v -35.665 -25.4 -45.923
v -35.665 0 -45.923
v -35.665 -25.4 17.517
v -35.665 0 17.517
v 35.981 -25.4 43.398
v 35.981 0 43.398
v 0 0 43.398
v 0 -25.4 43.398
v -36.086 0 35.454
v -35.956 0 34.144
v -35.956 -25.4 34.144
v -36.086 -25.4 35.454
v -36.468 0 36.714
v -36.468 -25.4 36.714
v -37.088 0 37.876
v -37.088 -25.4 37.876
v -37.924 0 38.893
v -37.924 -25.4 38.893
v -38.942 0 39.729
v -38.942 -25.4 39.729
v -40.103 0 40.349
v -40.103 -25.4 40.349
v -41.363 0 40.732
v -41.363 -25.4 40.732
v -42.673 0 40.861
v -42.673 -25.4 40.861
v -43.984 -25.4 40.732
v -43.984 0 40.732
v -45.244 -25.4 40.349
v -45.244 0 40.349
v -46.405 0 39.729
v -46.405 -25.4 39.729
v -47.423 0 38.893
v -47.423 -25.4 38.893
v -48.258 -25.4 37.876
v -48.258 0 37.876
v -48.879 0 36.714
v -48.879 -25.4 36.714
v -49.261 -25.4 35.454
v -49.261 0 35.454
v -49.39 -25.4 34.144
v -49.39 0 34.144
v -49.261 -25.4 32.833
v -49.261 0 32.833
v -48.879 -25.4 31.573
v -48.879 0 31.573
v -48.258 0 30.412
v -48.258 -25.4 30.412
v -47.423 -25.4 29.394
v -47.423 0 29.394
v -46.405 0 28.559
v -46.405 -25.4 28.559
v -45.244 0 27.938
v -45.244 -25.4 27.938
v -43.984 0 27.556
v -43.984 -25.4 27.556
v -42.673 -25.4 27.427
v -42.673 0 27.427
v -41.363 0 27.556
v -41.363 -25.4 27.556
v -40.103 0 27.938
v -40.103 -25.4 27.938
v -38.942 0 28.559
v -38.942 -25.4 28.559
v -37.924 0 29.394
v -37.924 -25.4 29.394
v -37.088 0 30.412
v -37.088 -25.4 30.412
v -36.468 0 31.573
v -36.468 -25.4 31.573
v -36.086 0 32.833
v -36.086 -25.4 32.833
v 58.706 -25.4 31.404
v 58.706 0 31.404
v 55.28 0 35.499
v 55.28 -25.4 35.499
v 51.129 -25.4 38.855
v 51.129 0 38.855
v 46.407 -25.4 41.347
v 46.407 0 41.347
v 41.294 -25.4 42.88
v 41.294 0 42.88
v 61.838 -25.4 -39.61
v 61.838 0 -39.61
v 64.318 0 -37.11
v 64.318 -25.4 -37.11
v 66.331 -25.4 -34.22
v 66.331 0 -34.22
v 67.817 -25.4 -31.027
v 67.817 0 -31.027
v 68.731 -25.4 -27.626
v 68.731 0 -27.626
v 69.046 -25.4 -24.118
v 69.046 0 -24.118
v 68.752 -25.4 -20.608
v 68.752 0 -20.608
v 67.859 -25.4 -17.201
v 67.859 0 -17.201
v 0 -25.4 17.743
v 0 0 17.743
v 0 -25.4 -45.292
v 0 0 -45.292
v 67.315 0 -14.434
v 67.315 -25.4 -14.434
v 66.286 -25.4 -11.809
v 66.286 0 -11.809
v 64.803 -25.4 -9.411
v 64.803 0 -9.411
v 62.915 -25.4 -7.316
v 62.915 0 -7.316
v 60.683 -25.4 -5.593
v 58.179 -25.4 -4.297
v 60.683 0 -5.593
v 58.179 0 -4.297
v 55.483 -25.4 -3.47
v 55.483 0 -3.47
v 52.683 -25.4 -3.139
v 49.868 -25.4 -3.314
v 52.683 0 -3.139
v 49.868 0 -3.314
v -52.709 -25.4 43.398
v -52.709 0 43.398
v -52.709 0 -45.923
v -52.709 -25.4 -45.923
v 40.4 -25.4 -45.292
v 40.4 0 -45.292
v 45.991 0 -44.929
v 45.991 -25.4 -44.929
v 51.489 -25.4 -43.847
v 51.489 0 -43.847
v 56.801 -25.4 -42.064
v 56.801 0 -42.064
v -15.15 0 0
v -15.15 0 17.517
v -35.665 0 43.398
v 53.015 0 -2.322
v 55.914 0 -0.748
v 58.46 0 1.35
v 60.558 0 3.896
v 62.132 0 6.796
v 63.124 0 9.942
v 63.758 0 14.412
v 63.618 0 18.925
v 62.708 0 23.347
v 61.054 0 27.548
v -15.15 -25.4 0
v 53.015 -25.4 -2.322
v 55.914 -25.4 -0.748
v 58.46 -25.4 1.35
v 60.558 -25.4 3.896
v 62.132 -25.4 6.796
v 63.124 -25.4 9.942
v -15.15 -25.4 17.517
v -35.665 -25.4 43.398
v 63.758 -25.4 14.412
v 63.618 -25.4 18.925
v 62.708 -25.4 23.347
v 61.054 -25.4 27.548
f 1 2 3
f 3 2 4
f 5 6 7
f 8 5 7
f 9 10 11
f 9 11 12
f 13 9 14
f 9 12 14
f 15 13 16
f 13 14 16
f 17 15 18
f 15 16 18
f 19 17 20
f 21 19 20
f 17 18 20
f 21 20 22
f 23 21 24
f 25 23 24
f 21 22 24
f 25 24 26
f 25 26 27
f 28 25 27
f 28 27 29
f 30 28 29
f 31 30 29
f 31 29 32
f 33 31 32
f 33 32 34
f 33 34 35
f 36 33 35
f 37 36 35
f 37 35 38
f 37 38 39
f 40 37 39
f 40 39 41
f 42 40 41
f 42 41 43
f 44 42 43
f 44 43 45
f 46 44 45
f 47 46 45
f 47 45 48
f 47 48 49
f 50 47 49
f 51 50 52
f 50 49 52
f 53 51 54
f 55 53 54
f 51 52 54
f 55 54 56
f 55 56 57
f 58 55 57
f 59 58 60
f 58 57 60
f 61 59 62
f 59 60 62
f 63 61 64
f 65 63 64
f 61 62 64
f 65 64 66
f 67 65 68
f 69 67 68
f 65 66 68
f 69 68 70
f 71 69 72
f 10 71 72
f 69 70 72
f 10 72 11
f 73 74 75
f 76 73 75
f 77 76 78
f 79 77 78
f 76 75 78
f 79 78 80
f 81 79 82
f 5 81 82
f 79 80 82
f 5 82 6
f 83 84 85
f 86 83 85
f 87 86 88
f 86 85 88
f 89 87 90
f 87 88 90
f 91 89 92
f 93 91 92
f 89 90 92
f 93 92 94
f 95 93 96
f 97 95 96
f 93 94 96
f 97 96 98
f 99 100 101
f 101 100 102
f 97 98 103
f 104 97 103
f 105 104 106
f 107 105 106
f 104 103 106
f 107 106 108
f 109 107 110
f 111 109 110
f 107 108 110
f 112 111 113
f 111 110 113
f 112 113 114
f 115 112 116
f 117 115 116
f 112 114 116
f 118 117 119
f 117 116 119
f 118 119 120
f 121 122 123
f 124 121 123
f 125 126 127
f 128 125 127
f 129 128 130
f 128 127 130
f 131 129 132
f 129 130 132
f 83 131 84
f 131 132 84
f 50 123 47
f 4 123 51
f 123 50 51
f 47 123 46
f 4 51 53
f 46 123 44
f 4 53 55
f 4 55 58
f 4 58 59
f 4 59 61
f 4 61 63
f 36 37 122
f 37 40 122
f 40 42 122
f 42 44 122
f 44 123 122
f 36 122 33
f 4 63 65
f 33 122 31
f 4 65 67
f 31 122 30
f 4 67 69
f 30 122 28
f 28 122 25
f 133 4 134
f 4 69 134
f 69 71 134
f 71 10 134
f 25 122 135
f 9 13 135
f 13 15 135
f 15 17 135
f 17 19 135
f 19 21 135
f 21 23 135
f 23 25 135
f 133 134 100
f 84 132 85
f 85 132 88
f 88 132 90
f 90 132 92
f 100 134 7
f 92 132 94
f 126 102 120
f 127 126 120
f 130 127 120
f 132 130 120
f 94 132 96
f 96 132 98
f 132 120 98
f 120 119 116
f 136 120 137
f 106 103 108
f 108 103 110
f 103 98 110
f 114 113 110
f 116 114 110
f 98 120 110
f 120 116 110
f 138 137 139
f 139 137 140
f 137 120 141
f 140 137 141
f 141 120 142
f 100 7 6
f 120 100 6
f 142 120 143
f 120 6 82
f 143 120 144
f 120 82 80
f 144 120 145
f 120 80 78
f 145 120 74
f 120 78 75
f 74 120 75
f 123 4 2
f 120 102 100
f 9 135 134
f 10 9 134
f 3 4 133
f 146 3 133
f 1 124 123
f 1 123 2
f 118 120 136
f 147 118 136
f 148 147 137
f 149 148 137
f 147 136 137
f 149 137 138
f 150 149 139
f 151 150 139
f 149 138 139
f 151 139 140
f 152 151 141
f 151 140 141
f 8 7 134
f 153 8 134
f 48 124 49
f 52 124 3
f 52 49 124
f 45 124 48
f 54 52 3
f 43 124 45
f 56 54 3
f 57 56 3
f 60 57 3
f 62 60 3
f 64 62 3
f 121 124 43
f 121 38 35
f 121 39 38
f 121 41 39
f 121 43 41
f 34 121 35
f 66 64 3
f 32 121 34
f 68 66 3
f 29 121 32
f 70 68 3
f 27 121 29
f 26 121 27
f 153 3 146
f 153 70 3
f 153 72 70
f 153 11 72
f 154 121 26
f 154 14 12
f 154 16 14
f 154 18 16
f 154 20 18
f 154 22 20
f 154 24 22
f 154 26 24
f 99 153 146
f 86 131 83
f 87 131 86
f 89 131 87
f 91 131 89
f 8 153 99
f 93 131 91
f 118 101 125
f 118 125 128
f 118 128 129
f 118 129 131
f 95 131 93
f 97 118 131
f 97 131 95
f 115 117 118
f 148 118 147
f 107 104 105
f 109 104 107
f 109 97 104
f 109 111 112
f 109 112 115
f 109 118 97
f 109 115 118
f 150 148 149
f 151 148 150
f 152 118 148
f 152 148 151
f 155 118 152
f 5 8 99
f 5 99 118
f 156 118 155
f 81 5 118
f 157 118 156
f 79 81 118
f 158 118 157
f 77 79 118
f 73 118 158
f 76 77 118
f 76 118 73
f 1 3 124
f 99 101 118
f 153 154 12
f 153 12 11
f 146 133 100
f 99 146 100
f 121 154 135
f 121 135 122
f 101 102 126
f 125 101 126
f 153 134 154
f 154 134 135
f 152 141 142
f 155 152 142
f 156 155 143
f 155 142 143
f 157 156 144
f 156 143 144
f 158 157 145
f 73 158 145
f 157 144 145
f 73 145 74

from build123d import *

# Parameters (mm, degrees)
F1_DEPTH = 25.4
F2_R     = 6.716899
F3_DEPTH = 127


with BuildPart() as f1:
    # F0 (on Front) → F1 (new body)
    with BuildSketch(Plane.XZ):
        with BuildLine():
            Line((-35.665207, 43.39793), (-52.70876, 43.39793))
            Line((-52.70876, 43.39793), (-52.70876, -45.922898))
            Line((-52.70876, -45.922898), (-35.665207, -45.922898))
            Line((-35.665207, -45.922898), (-35.665207, 17.516982))
            Line((-35.665207, 17.516982), (-15.149822, 0))
            Line((-15.149822, 0), (0, 17.743035))
            Line((0, 17.743035), (0, -45.291658))
            Line((0, -45.291658), (40.399529, -45.291658))
            ThreePointArc((40.399529, -45.291658), (51.488685, -43.847265), (61.83785, -39.610472))
            ThreePointArc((61.83785, -39.610472), (68.347577, -29.346101), (67.858577, -17.20136))
            ThreePointArc((67.858577, -17.20136), (61.83785, -6.404388), (49.868163, -3.314024))
            ThreePointArc((49.868163, -3.314024), (58.459886, 1.350347), (63.124254, 9.942072))
            ThreePointArc((63.124254, 9.942072), (63.258051, 21.155608), (58.705557, 31.40432))
            ThreePointArc((58.705557, 31.40432), (48.828592, 40.215562), (35.980832, 43.39793))
            Line((35.980832, 43.39793), (0, 43.39793))
            Line((0, 43.39793), (-15.149822, 17.516982))
            Line((-15.149822, 17.516982), (-35.665207, 43.39793))
        make_face()
    extrude(amount=F1_DEPTH)

    # F2 (on face) → F3 (cut)
    with BuildSketch(Plane.XZ.offset(25.4)):
        with Locations((-42.673375, 34.143802)):
            Circle(F2_R)
    extrude(amount=-F3_DEPTH, mode=Mode.SUBTRACT)


solid = f1.part
